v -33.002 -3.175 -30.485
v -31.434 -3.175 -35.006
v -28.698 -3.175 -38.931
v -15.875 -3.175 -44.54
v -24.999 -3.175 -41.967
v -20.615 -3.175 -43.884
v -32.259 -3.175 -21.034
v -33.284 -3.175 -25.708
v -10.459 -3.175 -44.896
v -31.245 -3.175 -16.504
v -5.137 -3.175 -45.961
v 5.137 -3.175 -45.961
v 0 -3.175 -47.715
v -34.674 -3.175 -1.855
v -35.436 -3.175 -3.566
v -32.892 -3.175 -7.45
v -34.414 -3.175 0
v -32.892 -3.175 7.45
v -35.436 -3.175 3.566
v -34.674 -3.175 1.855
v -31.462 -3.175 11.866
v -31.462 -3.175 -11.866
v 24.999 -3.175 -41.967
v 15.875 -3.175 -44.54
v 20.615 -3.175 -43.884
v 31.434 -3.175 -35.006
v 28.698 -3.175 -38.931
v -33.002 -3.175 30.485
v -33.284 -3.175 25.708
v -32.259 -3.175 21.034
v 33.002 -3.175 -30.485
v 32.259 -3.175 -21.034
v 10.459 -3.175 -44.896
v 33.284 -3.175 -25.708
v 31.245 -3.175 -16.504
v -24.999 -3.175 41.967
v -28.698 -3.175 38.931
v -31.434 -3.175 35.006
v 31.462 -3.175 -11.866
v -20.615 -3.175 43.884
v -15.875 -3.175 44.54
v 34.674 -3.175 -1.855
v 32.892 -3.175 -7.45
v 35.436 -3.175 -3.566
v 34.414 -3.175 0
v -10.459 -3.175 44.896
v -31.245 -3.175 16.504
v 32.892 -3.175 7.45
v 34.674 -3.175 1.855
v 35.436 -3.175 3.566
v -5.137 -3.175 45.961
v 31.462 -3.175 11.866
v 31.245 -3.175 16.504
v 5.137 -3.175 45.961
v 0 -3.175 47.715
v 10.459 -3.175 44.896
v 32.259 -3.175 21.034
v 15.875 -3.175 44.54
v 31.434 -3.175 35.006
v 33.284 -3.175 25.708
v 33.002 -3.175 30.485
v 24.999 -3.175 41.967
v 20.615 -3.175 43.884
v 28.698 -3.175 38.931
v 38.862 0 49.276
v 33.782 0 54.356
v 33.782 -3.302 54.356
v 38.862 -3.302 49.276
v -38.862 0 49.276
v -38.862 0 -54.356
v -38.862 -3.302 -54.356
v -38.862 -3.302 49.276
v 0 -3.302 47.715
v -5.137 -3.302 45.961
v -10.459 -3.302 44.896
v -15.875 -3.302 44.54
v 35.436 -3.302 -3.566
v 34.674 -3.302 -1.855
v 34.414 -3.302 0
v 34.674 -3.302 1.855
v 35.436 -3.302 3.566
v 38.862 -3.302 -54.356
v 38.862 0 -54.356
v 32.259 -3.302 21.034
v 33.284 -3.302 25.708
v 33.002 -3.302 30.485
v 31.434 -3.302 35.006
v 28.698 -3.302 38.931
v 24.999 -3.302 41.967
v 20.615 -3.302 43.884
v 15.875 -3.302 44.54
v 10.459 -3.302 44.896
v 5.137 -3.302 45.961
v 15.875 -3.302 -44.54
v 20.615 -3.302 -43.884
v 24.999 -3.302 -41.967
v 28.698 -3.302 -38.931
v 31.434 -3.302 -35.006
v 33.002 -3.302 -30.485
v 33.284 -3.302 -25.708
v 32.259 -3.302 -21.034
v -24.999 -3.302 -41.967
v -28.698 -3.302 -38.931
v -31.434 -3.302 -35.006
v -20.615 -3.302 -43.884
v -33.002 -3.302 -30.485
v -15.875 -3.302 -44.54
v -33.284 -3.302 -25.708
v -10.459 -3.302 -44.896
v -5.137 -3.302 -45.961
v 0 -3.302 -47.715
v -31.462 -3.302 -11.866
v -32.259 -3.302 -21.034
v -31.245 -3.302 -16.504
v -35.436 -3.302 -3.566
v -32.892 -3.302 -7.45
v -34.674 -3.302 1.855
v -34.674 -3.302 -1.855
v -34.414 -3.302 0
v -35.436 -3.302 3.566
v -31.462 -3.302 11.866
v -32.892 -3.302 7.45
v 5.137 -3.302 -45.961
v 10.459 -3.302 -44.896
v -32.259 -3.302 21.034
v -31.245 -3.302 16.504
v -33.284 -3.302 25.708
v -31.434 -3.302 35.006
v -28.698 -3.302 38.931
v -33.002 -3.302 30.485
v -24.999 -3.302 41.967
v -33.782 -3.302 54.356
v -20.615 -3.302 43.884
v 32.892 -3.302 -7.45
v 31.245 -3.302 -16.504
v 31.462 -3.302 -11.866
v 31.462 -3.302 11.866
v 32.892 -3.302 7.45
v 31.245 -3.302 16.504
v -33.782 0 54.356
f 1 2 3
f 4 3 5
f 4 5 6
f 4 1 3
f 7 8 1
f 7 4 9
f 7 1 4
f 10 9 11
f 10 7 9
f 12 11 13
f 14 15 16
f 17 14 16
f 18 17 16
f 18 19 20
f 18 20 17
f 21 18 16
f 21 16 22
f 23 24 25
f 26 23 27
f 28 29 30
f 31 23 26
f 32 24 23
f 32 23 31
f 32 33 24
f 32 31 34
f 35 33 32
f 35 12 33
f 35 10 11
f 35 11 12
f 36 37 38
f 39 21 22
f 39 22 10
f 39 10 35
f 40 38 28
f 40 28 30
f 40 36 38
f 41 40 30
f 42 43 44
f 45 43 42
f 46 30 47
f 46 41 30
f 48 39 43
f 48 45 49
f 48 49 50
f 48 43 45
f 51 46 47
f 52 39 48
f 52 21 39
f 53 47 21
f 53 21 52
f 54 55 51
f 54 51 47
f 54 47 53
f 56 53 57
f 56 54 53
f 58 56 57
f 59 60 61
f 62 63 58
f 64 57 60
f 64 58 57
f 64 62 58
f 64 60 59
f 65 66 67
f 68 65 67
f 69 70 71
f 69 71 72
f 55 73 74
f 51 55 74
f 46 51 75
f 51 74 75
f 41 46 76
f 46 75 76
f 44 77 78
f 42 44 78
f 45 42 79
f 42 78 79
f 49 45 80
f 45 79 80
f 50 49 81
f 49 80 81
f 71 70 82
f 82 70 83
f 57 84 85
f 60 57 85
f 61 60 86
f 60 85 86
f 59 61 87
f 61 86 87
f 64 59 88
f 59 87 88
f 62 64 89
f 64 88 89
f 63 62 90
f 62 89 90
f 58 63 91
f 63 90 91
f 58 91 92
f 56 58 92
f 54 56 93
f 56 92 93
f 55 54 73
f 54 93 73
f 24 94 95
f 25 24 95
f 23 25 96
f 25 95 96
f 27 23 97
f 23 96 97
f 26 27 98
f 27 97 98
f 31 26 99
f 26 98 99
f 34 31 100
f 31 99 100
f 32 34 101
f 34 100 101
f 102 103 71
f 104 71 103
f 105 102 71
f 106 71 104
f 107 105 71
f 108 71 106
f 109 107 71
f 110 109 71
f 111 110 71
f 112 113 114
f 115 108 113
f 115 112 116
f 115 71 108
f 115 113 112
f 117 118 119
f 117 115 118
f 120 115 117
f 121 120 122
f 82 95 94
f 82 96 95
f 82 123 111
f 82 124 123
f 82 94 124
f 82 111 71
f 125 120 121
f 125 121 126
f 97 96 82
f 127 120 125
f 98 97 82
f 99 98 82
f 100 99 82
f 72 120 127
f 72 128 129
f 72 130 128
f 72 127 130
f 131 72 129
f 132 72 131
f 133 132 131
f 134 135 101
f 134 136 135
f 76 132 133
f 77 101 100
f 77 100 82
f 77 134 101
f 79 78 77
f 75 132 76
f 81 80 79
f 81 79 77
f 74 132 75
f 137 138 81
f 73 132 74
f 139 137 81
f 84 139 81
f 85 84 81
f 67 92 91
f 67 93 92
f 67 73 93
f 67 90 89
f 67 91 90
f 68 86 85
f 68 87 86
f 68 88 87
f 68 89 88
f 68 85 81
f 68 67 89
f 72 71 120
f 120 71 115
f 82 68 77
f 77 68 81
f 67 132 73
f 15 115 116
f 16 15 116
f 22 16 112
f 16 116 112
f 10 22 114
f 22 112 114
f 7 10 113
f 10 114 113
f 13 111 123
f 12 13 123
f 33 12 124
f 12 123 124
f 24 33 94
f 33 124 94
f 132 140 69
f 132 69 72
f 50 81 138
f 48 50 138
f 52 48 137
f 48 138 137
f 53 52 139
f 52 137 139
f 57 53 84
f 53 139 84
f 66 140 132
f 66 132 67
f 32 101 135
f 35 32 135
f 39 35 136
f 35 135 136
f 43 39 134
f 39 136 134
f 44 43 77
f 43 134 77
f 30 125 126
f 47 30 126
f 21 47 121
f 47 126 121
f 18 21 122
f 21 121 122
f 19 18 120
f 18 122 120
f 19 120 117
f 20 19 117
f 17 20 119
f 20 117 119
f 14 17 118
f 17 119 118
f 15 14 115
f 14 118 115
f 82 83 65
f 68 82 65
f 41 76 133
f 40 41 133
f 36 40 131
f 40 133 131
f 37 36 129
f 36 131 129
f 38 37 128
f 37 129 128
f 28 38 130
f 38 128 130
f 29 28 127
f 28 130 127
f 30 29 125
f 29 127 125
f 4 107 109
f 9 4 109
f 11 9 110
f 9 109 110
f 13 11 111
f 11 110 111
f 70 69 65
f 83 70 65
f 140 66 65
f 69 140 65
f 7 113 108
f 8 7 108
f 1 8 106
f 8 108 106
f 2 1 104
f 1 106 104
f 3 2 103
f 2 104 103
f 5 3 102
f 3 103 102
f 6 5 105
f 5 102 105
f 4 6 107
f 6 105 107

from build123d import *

# Parameters (mm, degrees)
F0_W     = 77.724
F0_H     = 108.712
F1_DEPTH = 3.302
F3_R     = 13.3445871966
F4_DEPTH = 3.302
F5_SIZE  = 5.08
F6_DEPTH = 0.127


with BuildPart() as f1:
    # F0 (on Front) → F1 (new body)
    with BuildSketch(Plane.XZ):
        Rectangle(F0_W, F0_H)
    extrude(amount=F1_DEPTH)

    # F3 (on face) → F4 (join)
    with BuildSketch(Plane.XZ.offset(3.302)):
        with BuildLine():
            add(Edge.make_bspline(
                [(-33.1284857231, -24.3833554431), (-30.3980902484, -23.448268281), (-27.6625298974, -23.0135580616), (-24.9168122419, -22.8877504962)],
                knots=[0.0236239796, 0.0236239796, 0.0236239796, 0.0236239796, 0.1438563975, 0.1438563975, 0.1438563975, 0.1438563975], degree=3))
            ThreePointArc((-33.1284857231, -24.3833554431), (-29.1410849834, -38.4326879001), (-15.8749999992, -44.5395771521))
            ThreePointArc((-15.8749999992, -44.5395771521), (-7.7803065213, -45.3411097626), (9e-10, -47.7145771515))
            ThreePointArc((9e-10, -47.7145771515), (7.780306523, -45.3411097624), (15.8750000008, -44.5395771515))
            ThreePointArc((15.8750000008, -44.5395771515), (28.9710149024, -38.6284104056), (33.2008619827, -24.8968448621))
            add(Edge.make_bspline(
                [(22.7832318895, -28.264905571), (26.870414184, -28.3483991479), (30.7081117423, -27.7740633769), (33.2008619827, -24.8968448621)],
                knots=[0.8224951004, 0.8224951004, 0.8224951004, 0.8224951004, 0.9908039431, 0.9908039431, 0.9908039431, 0.9908039431], degree=3))
            add(Edge.make_bspline(
                [(15.9953683619, -27.7933645546), (16.7598950609, -27.862629463), (19.0104314318, -28.0581684328), (21.3052242348, -28.2347126075), (22.7832318895, -28.264905571)],
                knots=[0.7300371536, 0.7300371536, 0.7300371536, 0.7300371536, 0.7616312241, 0.8224951004, 0.8224951004, 0.8224951004, 0.8224951004], degree=3))
            add(Edge.make_bspline(
                [(12.0445173218, -27.4086319137), (13.3501324037, -27.5450763369), (14.6659309282, -27.6729196282), (15.9953683619, -27.7933645546)],
                knots=[0.6750981435, 0.6750981435, 0.6750981435, 0.6750981435, 0.7300371536, 0.7300371536, 0.7300371536, 0.7300371536], degree=3))
            add(Edge.make_bspline(
                [(6.5035843618, -26.7679947406), (8.3365045469, -27.0014140297), (10.1801283043, -27.2137923413), (12.0445173218, -27.4086319137)],
                knots=[0.5966464709, 0.5966464709, 0.5966464709, 0.5966464709, 0.6750981435, 0.6750981435, 0.6750981435, 0.6750981435], degree=3))
            add(Edge.make_bspline(
                [(-15.7821923495, -23.3437299796), (-10.5480047667, -23.9624284424), (-3.1004870846, -25.4363431139), (4.3262408996, -26.490713729), (6.5035843618, -26.7679947406)],
                knots=[0.2765511336, 0.2765511336, 0.2765511336, 0.2765511336, 0.5034529768, 0.5966464709, 0.5966464709, 0.5966464709, 0.5966464709], degree=3))
            add(Edge.make_bspline(
                [(-24.9168122419, -22.8877504962), (-22.5127229742, -22.777596192), (-19.4725911361, -22.9372512735), (-16.4147628171, -23.2689580365), (-15.7821923495, -23.3437299796)],
                knots=[0.1438563975, 0.1438563975, 0.1438563975, 0.1438563975, 0.2491292266, 0.2765511336, 0.2765511336, 0.2765511336, 0.2765511336], degree=3))
        make_face()
        with BuildLine():
            ThreePointArc((-24.3962783332, -9.4429305632), (-23.5493439512, -16.2082072875), (-24.9168122419, -22.8877504962))
            add(Edge.make_bspline(
                [(-24.9168122419, -22.8877504962), (-22.5127229742, -22.777596192), (-19.4725911361, -22.9372512735), (-16.4147628171, -23.2689580365), (-15.7821923495, -23.3437299796)],
                knots=[0.1438563975, 0.1438563975, 0.1438563975, 0.1438563975, 0.2491292266, 0.2765511336, 0.2765511336, 0.2765511336, 0.2765511336], degree=3))
            ThreePointArc((-15.7821923495, -23.3437299796), (-16.7909764629, -16.1431204561), (-15.7821923495, -8.9425109327))
            add(Edge.make_bspline(
                [(-20.8150930703, 3.0249084812), (-20.084698855, 3.2617064252), (-18.5750809579, 3.7511331524), (-20.1108934357, 5.7423249077), (-21.3989497629, 8.4805039988), (-19.5926222129, 8.6232034417), (-20.0960081308, 6.4882204736), (-17.9845367, 4.4717269755), (-19.4827279307, 7.4877563676), (-17.6531933794, 7.9935220173), (-17.6518746238, 3.7165445405), (-19.7201607312, 2.5442912986), (-19.0033211234, 0.5113026434), (-21.5358089244, 0.646088536), (-20.7796208818, -5.7027505195), (-14.9489180074, 0.0978196974), (-17.977030073, 1.5236381763), (-14.9168721562, 2.6666255778), (-16.1211586732, 6.3598723413), (-13.8328776174, 5.6005762962), (-15.1421128769, 3.3154322822), (-14.4747759607, 0.1624480587), (-13.8084140261, 5.1188240441), (-11.0343102947, 2.7331078221), (-14.5615723999, -0.162479085), (-17.3031216925, -3.3366762112), (-18.0975664008, -8.8898410691), (-13.4356882131, -5.5746333853), (-15.3648709473, -3.8082111356), (-12.0527139611, -3.6659211986), (-13.248535603, -1.079337143), (-9.5910344453, -1.7447413323), (-10.7422685487, 3.0079941618), (-8.9849464366, -1.96339633), (-8.8102943074, 5.4988116301), (-7.4861779197, -0.6957485248), (-9.6724060403, -0.966318494), (-11.0218385517, -3.5291741027), (-13.7004320012, -4.2797101397), (-12.8029593717, -6.9381020727), (-14.7089673153, -8.2196946287), (-15.7821923495, -8.9425109327)],
                knots=[0, 0, 0, 0, 0.0231511603, 0.0478500744, 0.0752755755, 0.0903366321, 0.1142638791, 0.1352244444, 0.1593040946, 0.1744947233, 0.2060790631, 0.2315955315, 0.2516703156, 0.2733460952, 0.3049833457, 0.3431527772, 0.3650886659, 0.3896180862, 0.4183185893, 0.4354180503, 0.4626318971, 0.4841465121, 0.512674348, 0.5346264378, 0.5675595767, 0.6056671213, 0.6368592747, 0.6681518224, 0.6879987795, 0.7121233264, 0.7334743783, 0.7591560932, 0.7848708559, 0.8073025156, 0.8374341523, 0.8673194844, 0.8904493251, 0.9187369989, 0.9444600919, 0.9686867066, 1, 1, 1, 1], degree=3))
            add(Edge.make_bspline(
                [(-25.8914344013, -2.4853385985), (-26.396572956, -2.0003344615), (-27.3138435109, -1.1196261405), (-29.1352849859, -2.0598979002), (-28.7106271057, 0.8204026064), (-32.0312644098, -1.1715068103), (-31.3002695814, 3.7485837155), (-29.4483178555, 3.8301118075), (-30.8071023081, 1.5653871303), (-28.9526334159, 1.3619840648), (-29.4792210737, 5.2085047756), (-26.921055424, 4.4342075194), (-28.8119762327, 2.2854028303), (-27.5906596289, -1.3990701213), (-27.7699356497, 3.0747016102), (-25.2099586785, 2.6066763518), (-26.5953437573, -0.395391095), (-23.7025988652, -2.0340069969), (-23.1772681034, -6.0499515041), (-20.5435134821, -4.1808959475), (-25.0748704565, 2.6489737746), (-20.1368344266, 0.7949418705), (-20.6048167244, 2.3336418411), (-20.8150930703, 3.0249084812)],
                knots=[0, 0, 0, 0, 0.0457250435, 0.0830311605, 0.1245988121, 0.1705511092, 0.2321726775, 0.2625557415, 0.30723362, 0.3358214151, 0.393012377, 0.4286583434, 0.4808472993, 0.5282384525, 0.5813000538, 0.6192860311, 0.6705302416, 0.7286736986, 0.7872738172, 0.8280557864, 0.9074882994, 0.958434574, 1, 1, 1, 1], degree=3))
            ThreePointArc((-25.8914344013, -2.4853385985), (-24.9290967698, -4.9824855111), (-24.3962783332, -7.6050683856))
            add(Edge.make_bspline(
                [(-24.3962783332, -9.4429305632), (-25.4357243907, -10.1342055857), (-27.412273175, -11.4486922391), (-27.4547789496, -7.4214675852), (-30.5466070306, -9.5733915774), (-30.4542370334, -5.4520792207), (-32.3177618611, -5.8417990903), (-32.7140680164, -4.2769830225), (-32.0543630337, -2.7007935171), (-32.1251676799, -4.5533058245), (-30.3843482976, -5.4648837492), (-32.0501040037, -1.6640768267), (-30.4436660674, -1.9005229869), (-30.1720801803, -6.5942041642), (-29.7456686663, -3.178537531), (-28.1334595609, -3.5814958653), (-29.8697325683, -5.6494579394), (-29.5018476184, -7.7306733995), (-27.2359049314, -6.3250302911), (-26.4788550338, -9.3239236743), (-25.0993332141, -8.1853413666), (-24.3962783332, -7.6050683856)],
                knots=[0, 0, 0, 0, 0.0670169121, 0.1274354192, 0.1840138636, 0.2505621343, 0.2960523516, 0.3441354147, 0.3840734056, 0.4287810373, 0.4665753725, 0.5348972739, 0.5667760176, 0.6369485958, 0.6883070256, 0.7231632661, 0.7842390879, 0.8324575559, 0.8851485442, 0.9414679355, 1, 1, 1, 1], degree=3))
        make_face()
        with BuildLine():
            add(Edge.make_bspline(
                [(-20.2924981713, -15.781018883), (-20.5370775999, -16.1379246214), (-20.134132622, -17.1534868603), (-20.8639151565, -18.5661521393), (-21.9358468203, -19.4575377926), (-22.3700864307, -21.8865095148), (-20.237349518, -21.5763362209), (-19.5672362136, -20.438180371), (-19.2965010699, -18.8033454883), (-19.7803037906, -17.8720601229), (-19.908738804, -16.4540465799), (-19.0188083322, -15.0649598827), (-20.0853771822, -15.4787748635), (-20.2924981713, -15.781018883)],
                knots=[0, 0, 0, 0, 0.0904118203, 0.1854248684, 0.2814922978, 0.3865094541, 0.4809925493, 0.5711470892, 0.6690619631, 0.748512495, 0.8439845899, 0.9234351565, 1, 1, 1, 1], degree=3))
        make_face(mode=Mode.SUBTRACT)
        with BuildLine():
            add(Edge.make_bspline(
                [(-22.3910957575, -11.5529615432), (-22.0568118654, -12.2037220004), (-21.1170784891, -12.8832887919), (-21.7129777335, -14.1967346716), (-20.5379115522, -14.568750962), (-20.4867607869, -13.5076873001), (-20.8432701563, -11.8831681267), (-21.6439811905, -11.2404808042), (-22.9718655512, -9.3501247732), (-22.6978835435, -10.9557285785), (-22.3910957575, -11.5529615432)],
                knots=[0, 0, 0, 0, 0.1505340204, 0.2658311351, 0.3614801071, 0.4617187858, 0.6051372816, 0.7298931385, 0.8618479683, 1, 1, 1, 1], degree=3))
        make_face(mode=Mode.SUBTRACT)
        with BuildLine():
            add(Edge.make_bspline(
                [(-18.3790698647, -10.1024601609), (-18.7969421772, -10.2564427963), (-19.1553590595, -11.577398565), (-19.219348267, -12.6506630096), (-19.2408550579, -13.9350019391), (-18.8743899715, -14.8858473731), (-18.2833235222, -14.0155234153), (-18.1315989973, -13.0706647968), (-18.7065283271, -12.3462231403), (-18.4694817034, -11.2210464666), (-17.1590443019, -10.374237249), (-18.0760721444, -9.9908079022), (-18.3790698647, -10.1024601609)],
                knots=[0, 0, 0, 0, 0.1240572212, 0.2333232805, 0.347818092, 0.428679644, 0.5131510602, 0.6107152668, 0.7012679009, 0.8047604962, 0.9100465523, 1, 1, 1, 1], degree=3))
        make_face(mode=Mode.SUBTRACT)
        with BuildLine():
            ThreePointArc((5.4403450859, -12.5461180708), (6.6092683485, -19.609411059), (6.5035843618, -26.7679947406))
            add(Edge.make_bspline(
                [(6.5035843618, -26.7679947406), (8.3365045469, -27.0014140297), (10.1801283043, -27.2137923413), (12.0445173218, -27.4086319137)],
                knots=[0.5966464709, 0.5966464709, 0.5966464709, 0.5966464709, 0.6750981435, 0.6750981435, 0.6750981435, 0.6750981435], degree=3))
            Line((12.0445173218, -27.4086319137), (12.0445173218, -21.4756764472))
            ThreePointArc((12.0445173218, -21.4756764472), (14.0199428419, -19.5002509271), (15.9953683619, -21.4756764472))
            Line((15.9953683619, -21.4756764472), (15.9953683619, -27.7933645546))
            add(Edge.make_bspline(
                [(15.9953683619, -27.7933645546), (16.7598950609, -27.862629463), (19.0104314318, -28.0581684328), (21.3052242348, -28.2347126075), (22.7832318895, -28.264905571)],
                knots=[0.7300371536, 0.7300371536, 0.7300371536, 0.7300371536, 0.7616312241, 0.8224951004, 0.8224951004, 0.8224951004, 0.8224951004], degree=3))
            ThreePointArc((22.7832318895, -28.264905571), (22.4736636829, -20.3696155623), (23.5801553445, -12.5461180708))
            Line((23.5801553445, -12.5461180708), (28.4554600831, -13.4531514135))
            ThreePointArc((28.4554600831, -13.4531514135), (31.673336573, -11.9989868814), (31.424967593, -8.4765393743))
            ThreePointArc((31.424967593, -8.4765393743), (29.2529740879, -8.2440657168), (29.0205004305, -10.4160592219))
            ThreePointArc((29.0205004305, -10.4160592219), (29.058069024, -11.9208265797), (27.614886003, -12.3485636115))
            ThreePointArc((27.614886003, -12.3485636115), (23.4712314741, -5.8636115848), (28.4554600831, 0))
            ThreePointArc((28.4554600831, 0), (23.3706331923, -0.6006945639), (18.2612345592, -0.9328753515))
            Line((18.2612345592, -0.9328753515), (21.109645709, 8.6648291047))
            Line((21.109645709, 8.6648291047), (22.7452469365, 8.179414619))
            ThreePointArc((22.7452469365, 8.179414619), (24.0675287583, 9.9087492795), (21.9295363303, 9.4988517773))
            ThreePointArc((21.9295363303, 9.4988517773), (17.0915933325, 15.0640837031), (15.5871994793, 22.2831070423))
            Line((15.5871994793, 22.2831070423), (14.8853833456, 29.6840668302))
            Line((14.8853833456, 29.6840668302), (17.9889984262, 30.165095753))
            Line((17.9889984262, 30.165095753), (17.720128815, 31.8998516907))
            Line((17.720128815, 31.8998516907), (14.8043116011, 31.4479295364))
            Line((14.8043116011, 31.4479295364), (14.2361351446, 35.1138234881))
            Line((14.2361351446, 35.1138234881), (12.1174789965, 34.7854532301))
            Line((12.1174789965, 34.7854532301), (12.6562453806, 31.3093140721))
            Line((12.6562453806, 31.3093140721), (10.0379107516, 30.7162171018))
            Line((10.0379107516, 30.7162171018), (10.2517836951, 29.4975203391))
            Line((10.2517836951, 29.4975203391), (12.7509497106, 29.9361068755))
            Line((12.7509497106, 29.9361068755), (14.0939988196, 22.2831070423))
            ThreePointArc((14.0939988196, 22.2831070423), (12.6245914015, 15.2177663733), (7.6988285058, 9.9437681912))
            ThreePointArc((7.6988285058, 9.9437681912), (5.5906171254, 10.4864212664), (6.8022884056, 8.6778637491))
            Line((6.8022884056, 8.6778637491), (8.4650181234, 9.060157463))
            Line((8.4650181234, 9.060157463), (10.762639533, -0.9330055424))
            ThreePointArc((10.762639533, -0.9330055424), (5.6515483018, -0.6008483836), (0.5650403473, 0))
            ThreePointArc((0.5650403473, 0), (5.5492689564, -5.8636115848), (1.4056144274, -12.3485636115))
            ThreePointArc((1.4056144274, -12.3485636115), (-0.0375685935, -11.9208265797), (0, -10.4160592219))
            ThreePointArc((0, -10.4160592219), (-0.2324736575, -8.2440657168), (-2.4044671625, -8.4765393743))
            ThreePointArc((-2.4044671625, -8.4765393743), (-2.6528361426, -11.9989868814), (0.5650403473, -13.4531514135))
            Line((0.5650403473, -13.4531514135), (5.4403450859, -12.5461180708))
        make_face()
        Polygon((9.1227404773, -7.4148867279), (8.4774624556, -4.9826856703), (9.749203307, -4.868891682), (10.3401336819, -7.1323132142), align=None, mode=Mode.SUBTRACT)
        Polygon((10.9397291529, -9.5362256838), (9.768018499, -9.8470877856), (9.2899553012, -8.0451578014), (10.461665955, -7.7342956997), align=None, mode=Mode.SUBTRACT)
        Polygon((12.2584053658, -7.3401992658), (12.7159978886, -9.0649705743), (11.5734964264, -9.3680832964), (11.1159039036, -7.6433119879), align=None, mode=Mode.SUBTRACT)
        Polygon((10.332212454, -4.8167246576), (11.5597705233, -4.7068840966), (12.1378842059, -6.8859273354), (10.9000811353, -7.0559568703), align=None, mode=Mode.SUBTRACT)
        Polygon((17.9045965268, -7.6433119879), (17.4470040041, -9.3680832964), (16.3045025419, -9.0649705743), (16.7620950646, -7.3401992658), align=None, mode=Mode.SUBTRACT)
        Polygon((18.5588344754, -7.7342956997), (19.7305451293, -8.0451578014), (19.2524819314, -9.8470877856), (18.0807712776, -9.5362256838), align=None, mode=Mode.SUBTRACT)
        Polygon((18.6803667486, -7.1323132142), (19.2712971234, -4.868891682), (20.5430379748, -4.9826856703), (19.8977599531, -7.4148867279), align=None, mode=Mode.SUBTRACT)
        Polygon((16.8826162245, -6.8859273354), (17.4607299071, -4.7068840966), (18.6882879764, -4.8167246576), (18.1204192951, -7.0559568703), align=None, mode=Mode.SUBTRACT)
        with BuildLine():
            ThreePointArc((14.2767767446, 4.6611620079), (12.1414040207, 5.7303494735), (11.1097303552, 7.8840968947))
            Line((11.1097303552, 7.8840968947), (14.2767767446, 7.8840968947))
            Line((14.2767767446, 7.8840968947), (14.2767767446, 4.6611620079))
        make_face(mode=Mode.SUBTRACT)
        with BuildLine():
            ThreePointArc((11.1459939594, 8.983289175), (12.2280091457, 10.9819830574), (14.2767767446, 11.9658963789))
            Line((14.2767767446, 11.9658963789), (14.2767767446, 8.983289175))
            Line((14.2767767446, 8.983289175), (11.1459939594, 8.983289175))
        make_face(mode=Mode.SUBTRACT)
        with BuildLine():
            ThreePointArc((18.430607267, 7.8840968947), (17.3673699452, 5.6986165643), (15.1747141111, 4.6502567644))
            Line((15.1747141111, 4.6502567644), (15.1747141111, 7.8840968947))
            Line((15.1747141111, 7.8840968947), (18.430607267, 7.8840968947))
        make_face(mode=Mode.SUBTRACT)
        with BuildLine():
            ThreePointArc((15.1747141111, 11.9768016224), (17.2797356479, 11.0126579566), (18.3943436628, 8.983289175))
            Line((18.3943436628, 8.983289175), (15.1747141111, 8.983289175))
            Line((15.1747141111, 8.983289175), (15.1747141111, 11.9768016224))
        make_face(mode=Mode.SUBTRACT)
        with BuildLine():
            ThreePointArc((1.5084841621, 28.7364097307), (5.1963193944, 39.8156504287), (15.8749999992, 44.5395771521))
            ThreePointArc((15.8749999992, 44.5395771521), (7.7803065213, 45.3411097626), (-9e-10, 47.7145771515))
            ThreePointArc((-9e-10, 47.7145771515), (-7.780306523, 45.3411097624), (-15.8750000008, 44.5395771515))
            ThreePointArc((-15.8750000008, 44.5395771515), (-30.2008361805, 37.0625327748), (-32.2586794783, 21.0343995142))
            ThreePointArc((-32.2586794783, 21.0343995142), (-31.4618060576, 11.8664205536), (-35.4362714152, 3.5663922047))
            ThreePointArc((-35.4362714152, 3.5663922047), (-26.8661908779, 8.4248419398), (-17.0921185192, 9.6570447531))
            ThreePointArc((-17.0921185192, 9.6570447531), (-3.3712650978, 14.8871009528), (1.5084841621, 28.7364097307))
        make_face()
        with Locations((-15.8750000008, 27.0770771515)):
            Circle(F3_R, mode=Mode.SUBTRACT)
    extrude(amount=-F4_DEPTH)

    # F5
    f5_edges = [f1.edges().sort_by_distance(p)[0] for p in [
        (-38.862, -1.651, 54.356),
        (38.862, -1.651, 54.356),
    ]]
    chamfer(f5_edges, length=F5_SIZE)

    # F2 (on face) → F6 (cut)
    with BuildSketch(Plane.XZ.offset(3.302)):
        with BuildLine():
            ThreePointArc((32.2586794783, -21.0343995142), (31.4618060576, -11.8664205536), (35.4362714152, -3.5663922047))
            ThreePointArc((35.4362714152, -3.5663922047), (34.4136259983, 6e-10), (35.436271415, 3.566392206))
            ThreePointArc((35.436271415, 3.566392206), (31.4618060572, 11.8664205547), (32.2586794775, 21.0343995154))
            ThreePointArc((32.2586794775, 21.0343995154), (30.2008361791, 37.0625327759), (15.8749999992, 44.5395771521))
            ThreePointArc((15.8749999992, 44.5395771521), (7.7803065213, 45.3411097626), (-9e-10, 47.7145771515))
            ThreePointArc((-9e-10, 47.7145771515), (-7.780306523, 45.3411097624), (-15.8750000008, 44.5395771515))
            ThreePointArc((-15.8750000008, 44.5395771515), (-30.2008361805, 37.0625327748), (-32.2586794783, 21.0343995142))
            ThreePointArc((-32.2586794783, 21.0343995142), (-31.4618060576, 11.8664205536), (-35.4362714152, 3.5663922047))
            ThreePointArc((-35.4362714152, 3.5663922047), (-34.4136259983, -6e-10), (-35.436271415, -3.566392206))
            ThreePointArc((-35.436271415, -3.566392206), (-31.4618060572, -11.8664205547), (-32.2586794775, -21.0343995154))
            ThreePointArc((-32.2586794775, -21.0343995154), (-30.2008361791, -37.0625327759), (-15.8749999992, -44.5395771521))
            ThreePointArc((-15.8749999992, -44.5395771521), (-7.7803065213, -45.3411097626), (9e-10, -47.7145771515))
            ThreePointArc((9e-10, -47.7145771515), (7.780306523, -45.3411097624), (15.8750000008, -44.5395771515))
            ThreePointArc((15.8750000008, -44.5395771515), (30.2008361805, -37.0625327748), (32.2586794783, -21.0343995142))
        make_face()
    extrude(amount=-F6_DEPTH, mode=Mode.SUBTRACT)


solid = f1.part
